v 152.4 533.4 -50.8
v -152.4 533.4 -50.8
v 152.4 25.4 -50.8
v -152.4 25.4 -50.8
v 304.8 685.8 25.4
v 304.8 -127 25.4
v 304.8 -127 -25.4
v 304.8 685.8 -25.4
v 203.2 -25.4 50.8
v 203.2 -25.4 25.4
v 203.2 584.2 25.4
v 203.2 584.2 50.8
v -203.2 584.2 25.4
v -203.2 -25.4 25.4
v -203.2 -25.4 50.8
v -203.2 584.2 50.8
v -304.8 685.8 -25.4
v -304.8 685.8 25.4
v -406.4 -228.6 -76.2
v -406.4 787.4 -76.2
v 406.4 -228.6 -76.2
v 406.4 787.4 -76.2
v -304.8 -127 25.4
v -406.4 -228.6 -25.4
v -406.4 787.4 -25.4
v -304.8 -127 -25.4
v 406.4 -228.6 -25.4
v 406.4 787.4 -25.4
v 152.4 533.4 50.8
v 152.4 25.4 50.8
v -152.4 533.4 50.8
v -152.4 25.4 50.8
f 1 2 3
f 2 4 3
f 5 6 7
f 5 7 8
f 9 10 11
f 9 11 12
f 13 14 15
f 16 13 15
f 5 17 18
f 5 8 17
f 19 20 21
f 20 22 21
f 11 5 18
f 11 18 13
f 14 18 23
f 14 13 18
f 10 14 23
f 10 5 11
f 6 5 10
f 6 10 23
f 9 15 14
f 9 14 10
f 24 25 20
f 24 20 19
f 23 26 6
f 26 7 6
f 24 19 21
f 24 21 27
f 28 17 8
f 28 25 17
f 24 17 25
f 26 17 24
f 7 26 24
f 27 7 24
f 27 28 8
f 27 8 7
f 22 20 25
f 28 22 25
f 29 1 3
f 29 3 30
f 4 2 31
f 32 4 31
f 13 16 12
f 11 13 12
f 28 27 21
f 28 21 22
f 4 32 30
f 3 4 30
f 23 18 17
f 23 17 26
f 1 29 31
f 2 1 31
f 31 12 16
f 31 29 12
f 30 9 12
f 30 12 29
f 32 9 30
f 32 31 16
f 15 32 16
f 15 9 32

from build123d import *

# Parameters (mm, degrees)
F0_W      = 406.4
F0_H      = 101.6
F1_DEPTH  = 25.4
F2_W      = 50.8
F2_H      = 101.6
F3_DEPTH  = 508
F4_W      = 406.4
F4_H      = 101.6
F5_DEPTH  = 50.8
F6_W      = 406.4
F6_H      = 609.6
F7_DEPTH  = 25.4
F8_W      = 406.4
F8_H      = 50.8
F9_DEPTH  = 203.2
F10_W     = 406.4
F10_H     = 50.8
F11_DEPTH = 101.6
F12_W     = 406.4
F12_H     = 50.8
F13_DEPTH = 203.2
F14_W     = 406.4
F14_H     = 50.8
F15_DEPTH = 101.6
F17_DEPTH = 203.2
F18_W     = 812.8
F18_H     = 50.8
F19_DEPTH = 101.6
F20_W     = 1016
F20_H     = 50.8
F21_DEPTH = 203.2
F22_W     = 812.8
F22_H     = 50.8
F23_DEPTH = 101.6


with BuildPart() as f1:
    # F0 (on Front) → F1 (new body, symmetric)
    with BuildSketch(Plane.XZ):
        Rectangle(F0_W, F0_H)
    extrude(amount=F1_DEPTH, both=True)

    # F2 (on face) → F3 (join)
    with BuildSketch(Plane(origin=(0, 25.4, 0), x_dir=(-1, 0, 0), z_dir=(0, 1, 0))):
        with Locations((-177.8, 0)):
            Rectangle(F2_W, F2_H)
        with Locations((177.8, 0)):
            Rectangle(F2_W, F2_H)
    extrude(amount=F3_DEPTH)

    # F4 (on face) → F5 (join)
    with BuildSketch(Plane(origin=(0, 533.4, 0), x_dir=(-1, 0, 0), z_dir=(0, 1, 0))):
        Rectangle(F4_W, F4_H)
    extrude(amount=F5_DEPTH)

    # F6 (on face) → F7 (join)
    with BuildSketch(Plane(origin=(0, 0, -50.8), x_dir=(1, 0, 0), z_dir=(0, 0, -1))):
        with Locations((0, -279.4)):
            Rectangle(F6_W, F6_H)
    extrude(amount=F7_DEPTH)

    # F8 (on face) → F9 (join)
    with BuildSketch(Plane.XZ.offset(25.4)):
        with Locations((0, -50.8)):
            Rectangle(F8_W, F8_H)
    extrude(amount=F9_DEPTH)

    # F10 (on face) → F11 (join)
    with BuildSketch(Plane.XZ.offset(25.4)):
        Rectangle(F10_W, F10_H)
    extrude(amount=F11_DEPTH)

    # F12 (on face) → F13 (join)
    with BuildSketch(Plane(origin=(0, 584.2, 0), x_dir=(-1, 0, 0), z_dir=(0, 1, 0))):
        with Locations((0, -50.8)):
            Rectangle(F12_W, F12_H)
    extrude(amount=F13_DEPTH)

    # F14 (on face) → F15 (join)
    with BuildSketch(Plane(origin=(0, 584.2, 0), x_dir=(-1, 0, 0), z_dir=(0, 1, 0))):
        Rectangle(F14_W, F14_H)
    extrude(amount=F15_DEPTH)

    # F16 (on face) → F17 (join)
    with BuildSketch(Plane.YZ.offset(203.2)):
        Polygon((-127, -25.4), (-228.6, -25.4), (-228.6, -76.2), (787.4, -76.2), (787.4, -25.4), (685.8, -25.4), align=None)
    extrude(amount=F17_DEPTH)

    # F18 (on face) → F19 (join)
    with BuildSketch(Plane.YZ.offset(203.2)):
        with Locations((279.4, 0)):
            Rectangle(F18_W, F18_H)
    extrude(amount=F19_DEPTH)

    # F20 (on face) → F21 (join)
    with BuildSketch(Plane(origin=(-203.2, 0, 0), x_dir=(0, -1, 0), z_dir=(-1, 0, 0))):
        with Locations((-279.4, -50.8)):
            Rectangle(F20_W, F20_H)
    extrude(amount=F21_DEPTH)

    # F22 (on face) → F23 (join)
    with BuildSketch(Plane(origin=(-203.2, 0, 0), x_dir=(0, -1, 0), z_dir=(-1, 0, 0))):
        with Locations((-279.4, 0)):
            Rectangle(F22_W, F22_H)
    extrude(amount=F23_DEPTH)


solid = f1.part
